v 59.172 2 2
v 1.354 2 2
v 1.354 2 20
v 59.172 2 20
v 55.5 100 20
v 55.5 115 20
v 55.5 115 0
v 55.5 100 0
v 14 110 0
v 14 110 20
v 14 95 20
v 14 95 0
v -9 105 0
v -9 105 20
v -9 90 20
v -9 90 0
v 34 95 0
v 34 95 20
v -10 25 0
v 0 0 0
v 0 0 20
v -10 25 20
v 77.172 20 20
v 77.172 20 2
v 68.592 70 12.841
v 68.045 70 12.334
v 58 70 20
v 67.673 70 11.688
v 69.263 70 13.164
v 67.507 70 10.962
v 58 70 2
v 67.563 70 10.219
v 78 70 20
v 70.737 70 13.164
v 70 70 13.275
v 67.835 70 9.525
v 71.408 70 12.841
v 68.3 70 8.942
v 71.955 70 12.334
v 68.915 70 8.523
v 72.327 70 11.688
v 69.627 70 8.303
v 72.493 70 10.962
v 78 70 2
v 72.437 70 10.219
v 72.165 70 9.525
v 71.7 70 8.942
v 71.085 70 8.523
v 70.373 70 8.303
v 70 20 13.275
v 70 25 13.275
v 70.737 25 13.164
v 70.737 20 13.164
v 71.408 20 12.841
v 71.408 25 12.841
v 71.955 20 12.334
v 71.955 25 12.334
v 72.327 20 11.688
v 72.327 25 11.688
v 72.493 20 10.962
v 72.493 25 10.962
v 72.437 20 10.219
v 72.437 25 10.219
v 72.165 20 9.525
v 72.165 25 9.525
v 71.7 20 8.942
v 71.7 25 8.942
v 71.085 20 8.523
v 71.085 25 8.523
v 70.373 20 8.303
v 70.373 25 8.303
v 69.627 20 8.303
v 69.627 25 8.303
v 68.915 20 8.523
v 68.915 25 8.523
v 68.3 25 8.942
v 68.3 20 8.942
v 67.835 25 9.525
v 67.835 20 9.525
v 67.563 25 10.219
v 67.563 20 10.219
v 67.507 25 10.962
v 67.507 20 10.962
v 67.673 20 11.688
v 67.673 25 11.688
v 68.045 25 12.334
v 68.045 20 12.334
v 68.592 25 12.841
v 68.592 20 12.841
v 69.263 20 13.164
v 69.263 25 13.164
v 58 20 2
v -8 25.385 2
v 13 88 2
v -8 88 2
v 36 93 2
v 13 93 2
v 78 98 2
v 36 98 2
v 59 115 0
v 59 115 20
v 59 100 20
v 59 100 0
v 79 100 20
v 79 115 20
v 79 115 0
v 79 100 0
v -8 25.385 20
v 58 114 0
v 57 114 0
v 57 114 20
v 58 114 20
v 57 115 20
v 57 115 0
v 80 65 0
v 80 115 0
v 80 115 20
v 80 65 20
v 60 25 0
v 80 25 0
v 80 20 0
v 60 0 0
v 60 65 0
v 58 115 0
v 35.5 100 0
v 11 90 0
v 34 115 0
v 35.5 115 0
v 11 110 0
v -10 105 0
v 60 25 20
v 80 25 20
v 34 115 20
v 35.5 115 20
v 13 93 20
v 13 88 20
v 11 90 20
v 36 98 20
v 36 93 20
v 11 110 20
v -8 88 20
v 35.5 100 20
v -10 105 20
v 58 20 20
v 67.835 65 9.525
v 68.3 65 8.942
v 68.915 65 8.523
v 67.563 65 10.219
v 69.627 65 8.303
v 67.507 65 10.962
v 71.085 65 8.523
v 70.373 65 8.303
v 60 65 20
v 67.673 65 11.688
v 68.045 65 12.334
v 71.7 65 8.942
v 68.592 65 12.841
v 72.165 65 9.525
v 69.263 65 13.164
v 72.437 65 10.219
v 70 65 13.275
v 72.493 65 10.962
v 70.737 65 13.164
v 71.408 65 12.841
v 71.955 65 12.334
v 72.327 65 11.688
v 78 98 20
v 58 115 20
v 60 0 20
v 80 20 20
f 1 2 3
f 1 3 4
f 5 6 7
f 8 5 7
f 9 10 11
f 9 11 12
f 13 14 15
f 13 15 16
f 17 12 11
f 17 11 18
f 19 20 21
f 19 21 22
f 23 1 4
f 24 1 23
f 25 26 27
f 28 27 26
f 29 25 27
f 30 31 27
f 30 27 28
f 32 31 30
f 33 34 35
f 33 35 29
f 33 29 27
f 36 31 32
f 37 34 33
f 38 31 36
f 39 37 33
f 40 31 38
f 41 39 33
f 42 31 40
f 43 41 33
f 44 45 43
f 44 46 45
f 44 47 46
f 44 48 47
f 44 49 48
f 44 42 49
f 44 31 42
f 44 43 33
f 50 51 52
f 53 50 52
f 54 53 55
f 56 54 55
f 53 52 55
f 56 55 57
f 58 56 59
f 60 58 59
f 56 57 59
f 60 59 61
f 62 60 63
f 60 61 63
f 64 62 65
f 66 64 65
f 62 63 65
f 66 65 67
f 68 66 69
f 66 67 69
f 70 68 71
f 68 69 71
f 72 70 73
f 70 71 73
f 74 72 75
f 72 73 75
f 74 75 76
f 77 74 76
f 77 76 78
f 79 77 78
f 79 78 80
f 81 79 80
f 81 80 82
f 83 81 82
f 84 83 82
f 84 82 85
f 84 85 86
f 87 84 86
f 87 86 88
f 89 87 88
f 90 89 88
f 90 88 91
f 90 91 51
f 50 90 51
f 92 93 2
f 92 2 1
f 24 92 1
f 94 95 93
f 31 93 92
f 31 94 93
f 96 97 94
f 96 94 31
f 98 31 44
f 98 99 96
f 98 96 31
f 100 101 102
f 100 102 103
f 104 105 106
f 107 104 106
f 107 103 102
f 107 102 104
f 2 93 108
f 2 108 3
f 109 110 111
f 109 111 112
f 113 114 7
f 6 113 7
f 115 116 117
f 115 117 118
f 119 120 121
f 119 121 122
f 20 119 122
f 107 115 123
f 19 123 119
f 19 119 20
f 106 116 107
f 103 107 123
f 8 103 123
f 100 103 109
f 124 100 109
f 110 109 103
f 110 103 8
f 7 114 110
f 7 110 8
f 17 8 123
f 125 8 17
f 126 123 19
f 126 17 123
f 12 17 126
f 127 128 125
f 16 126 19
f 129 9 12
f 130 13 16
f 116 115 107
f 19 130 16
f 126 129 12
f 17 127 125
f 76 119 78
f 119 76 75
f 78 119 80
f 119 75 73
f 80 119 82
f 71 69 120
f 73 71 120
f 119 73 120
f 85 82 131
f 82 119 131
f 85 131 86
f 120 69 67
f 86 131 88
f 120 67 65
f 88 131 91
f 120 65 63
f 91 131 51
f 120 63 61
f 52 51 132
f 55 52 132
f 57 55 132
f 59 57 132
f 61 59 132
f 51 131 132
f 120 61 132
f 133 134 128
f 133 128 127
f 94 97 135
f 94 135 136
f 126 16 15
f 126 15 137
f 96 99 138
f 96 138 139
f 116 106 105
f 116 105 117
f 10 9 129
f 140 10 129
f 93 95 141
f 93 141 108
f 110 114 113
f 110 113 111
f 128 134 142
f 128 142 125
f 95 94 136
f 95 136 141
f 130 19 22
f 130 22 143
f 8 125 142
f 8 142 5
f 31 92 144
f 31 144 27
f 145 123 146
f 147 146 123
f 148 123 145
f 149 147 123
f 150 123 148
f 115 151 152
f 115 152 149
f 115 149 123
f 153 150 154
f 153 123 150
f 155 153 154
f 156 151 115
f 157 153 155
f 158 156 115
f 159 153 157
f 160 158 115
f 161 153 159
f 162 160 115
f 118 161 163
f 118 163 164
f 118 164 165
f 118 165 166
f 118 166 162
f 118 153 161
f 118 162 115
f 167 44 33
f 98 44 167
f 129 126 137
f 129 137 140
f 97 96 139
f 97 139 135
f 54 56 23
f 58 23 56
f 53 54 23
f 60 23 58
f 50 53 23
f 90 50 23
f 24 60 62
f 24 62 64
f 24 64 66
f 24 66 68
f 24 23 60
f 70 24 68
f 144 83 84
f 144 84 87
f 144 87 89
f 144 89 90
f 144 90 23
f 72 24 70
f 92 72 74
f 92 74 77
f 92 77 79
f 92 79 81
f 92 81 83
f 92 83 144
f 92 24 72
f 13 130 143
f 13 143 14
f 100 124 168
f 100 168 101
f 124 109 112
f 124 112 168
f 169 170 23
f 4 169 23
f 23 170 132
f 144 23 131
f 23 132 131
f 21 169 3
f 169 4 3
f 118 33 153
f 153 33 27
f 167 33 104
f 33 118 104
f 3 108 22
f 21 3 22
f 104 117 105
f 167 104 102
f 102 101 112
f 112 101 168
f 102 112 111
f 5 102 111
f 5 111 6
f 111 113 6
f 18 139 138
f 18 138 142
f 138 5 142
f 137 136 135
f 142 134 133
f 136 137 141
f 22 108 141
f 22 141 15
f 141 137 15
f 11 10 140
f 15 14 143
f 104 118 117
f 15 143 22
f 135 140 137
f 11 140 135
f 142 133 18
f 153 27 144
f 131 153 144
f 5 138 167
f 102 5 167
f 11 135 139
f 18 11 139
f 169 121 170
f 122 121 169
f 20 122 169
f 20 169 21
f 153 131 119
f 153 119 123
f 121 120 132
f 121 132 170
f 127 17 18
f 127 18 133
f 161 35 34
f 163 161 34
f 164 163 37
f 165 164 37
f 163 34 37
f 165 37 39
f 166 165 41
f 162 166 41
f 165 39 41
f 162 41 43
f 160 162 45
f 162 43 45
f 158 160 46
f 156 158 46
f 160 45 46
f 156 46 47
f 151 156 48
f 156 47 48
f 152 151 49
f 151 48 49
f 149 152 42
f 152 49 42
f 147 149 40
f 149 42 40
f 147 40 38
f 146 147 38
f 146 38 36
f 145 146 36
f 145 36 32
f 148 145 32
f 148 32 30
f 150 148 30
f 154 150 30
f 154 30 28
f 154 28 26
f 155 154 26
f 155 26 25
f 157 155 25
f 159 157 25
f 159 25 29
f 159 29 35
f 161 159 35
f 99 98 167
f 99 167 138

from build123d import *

# Parameters (mm, degrees)
BOSS_EXTRUDE1_DEPTH = 20
SKETCH2_W           = 20
SKETCH2_H           = 40
CUT_EXTRUDE1_DEPTH  = 142.509716981
SKETCH20_W          = 20
SKETCH20_H          = 20
CUT_EXTRUDE11_DEPTH = 15
SKETCH22_W          = 20
SKETCH22_H          = 20
CUT_EXTRUDE13_DEPTH = 15
SKETCH21_W          = 20
SKETCH21_H          = 20
CUT_EXTRUDE12_DEPTH = 15
SHELL1_START        = 2
SHELL1_DEPTH        = 18
CUT_EXTRUDE10_REACH = 110.167
SKETCH19_R          = 2.5


# Read off the part's stored shape, not the designer's step: Shell1
with BuildPart() as part:
    # Sketch1 → Boss-Extrude1 (new body)
    with BuildSketch(Plane.XY):
        Polygon((58, 114), (58, 115), (80, 115), (80, 20), (60, 0), (0, 0), (-10, 25), (-10, 105), (11, 105), (11, 110), (12, 110), (34, 110), (34, 115), (35, 115), (57, 115), (57, 114), align=None)
    extrude(amount=BOSS_EXTRUDE1_DEPTH)

    # Sketch2 → Cut-Extrude1 (cut, through all)
    with BuildSketch(Plane.XY.offset(20)):
        with Locations((70, 45)):
            Rectangle(SKETCH2_W, SKETCH2_H)
    extrude(amount=-CUT_EXTRUDE1_DEPTH, mode=Mode.SUBTRACT)

    # Sketch20 → Cut-Extrude11 (cut)
    with BuildSketch(Plane(origin=(0, 115, 0), x_dir=(1, 0, 0), z_dir=(0, 1, 0))):
        with Locations((69, -10)):
            Rectangle(SKETCH20_W, SKETCH20_H)
        with Locations((45.5, -10)):
            Rectangle(SKETCH20_W, SKETCH20_H)
    extrude(amount=-CUT_EXTRUDE11_DEPTH, mode=Mode.SUBTRACT)

    # Sketch22 → Cut-Extrude13 (cut)
    with BuildSketch(Plane(origin=(0, 105, 0), x_dir=(1, 0, 0), z_dir=(0, 1, 0))):
        with Locations((1, -10)):
            Rectangle(SKETCH22_W, SKETCH22_H)
    extrude(amount=-CUT_EXTRUDE13_DEPTH, mode=Mode.SUBTRACT)

    # Sketch21 → Cut-Extrude12 (cut)
    with BuildSketch(Plane(origin=(0, 110, 0), x_dir=(1, 0, 0), z_dir=(0, 1, 0))):
        with Locations((24, -10)):
            Rectangle(SKETCH21_W, SKETCH21_H)
    extrude(amount=-CUT_EXTRUDE12_DEPTH, mode=Mode.SUBTRACT)

    # Shell1 outline → Shell1 (cut)
    with BuildSketch(Plane.XY.offset(SHELL1_START)):
        Polygon((58, 20), (58, 70), (78, 70), (78, 98), (36, 98), (36, 93), (13, 93), (13, 88), (-8, 88), (-8, 25.385164807), (1.354065923, 2), (59.171572875, 2), (77.171572875, 20), align=None)
    extrude(amount=SHELL1_DEPTH, mode=Mode.SUBTRACT)

    # Cut-Extrude10: up to this face of the body (flat: up to its plane)
    cut_extrude10_end = Plane(part.part.faces().sort_by_distance((67.585786438, 20, 11))[0])
    # Sketch19 → Cut-Extrude10 (cut, up to the picked face)
    with BuildSketch(Plane(origin=(0, 70, 0), x_dir=(1, 0, 0), z_dir=(0, 1, 0)), mode=Mode.PRIVATE) as cut_extrude10_sk1:
        with Locations(Location((70, -10.774964387, 0), (0, 0, 270))):
            Circle(SKETCH19_R)
    cut_extrude10_tool1 = split(extrude(cut_extrude10_sk1.sketch, amount=-CUT_EXTRUDE10_REACH, mode=Mode.PRIVATE), bisect_by=cut_extrude10_end, keep=Keep.BOTH, mode=Mode.PRIVATE)
    add(cut_extrude10_tool1.solids().sort_by(Axis((70, 70, 10.774964), (0, -1, 0)))[0], mode=Mode.SUBTRACT)


solid = part.part
